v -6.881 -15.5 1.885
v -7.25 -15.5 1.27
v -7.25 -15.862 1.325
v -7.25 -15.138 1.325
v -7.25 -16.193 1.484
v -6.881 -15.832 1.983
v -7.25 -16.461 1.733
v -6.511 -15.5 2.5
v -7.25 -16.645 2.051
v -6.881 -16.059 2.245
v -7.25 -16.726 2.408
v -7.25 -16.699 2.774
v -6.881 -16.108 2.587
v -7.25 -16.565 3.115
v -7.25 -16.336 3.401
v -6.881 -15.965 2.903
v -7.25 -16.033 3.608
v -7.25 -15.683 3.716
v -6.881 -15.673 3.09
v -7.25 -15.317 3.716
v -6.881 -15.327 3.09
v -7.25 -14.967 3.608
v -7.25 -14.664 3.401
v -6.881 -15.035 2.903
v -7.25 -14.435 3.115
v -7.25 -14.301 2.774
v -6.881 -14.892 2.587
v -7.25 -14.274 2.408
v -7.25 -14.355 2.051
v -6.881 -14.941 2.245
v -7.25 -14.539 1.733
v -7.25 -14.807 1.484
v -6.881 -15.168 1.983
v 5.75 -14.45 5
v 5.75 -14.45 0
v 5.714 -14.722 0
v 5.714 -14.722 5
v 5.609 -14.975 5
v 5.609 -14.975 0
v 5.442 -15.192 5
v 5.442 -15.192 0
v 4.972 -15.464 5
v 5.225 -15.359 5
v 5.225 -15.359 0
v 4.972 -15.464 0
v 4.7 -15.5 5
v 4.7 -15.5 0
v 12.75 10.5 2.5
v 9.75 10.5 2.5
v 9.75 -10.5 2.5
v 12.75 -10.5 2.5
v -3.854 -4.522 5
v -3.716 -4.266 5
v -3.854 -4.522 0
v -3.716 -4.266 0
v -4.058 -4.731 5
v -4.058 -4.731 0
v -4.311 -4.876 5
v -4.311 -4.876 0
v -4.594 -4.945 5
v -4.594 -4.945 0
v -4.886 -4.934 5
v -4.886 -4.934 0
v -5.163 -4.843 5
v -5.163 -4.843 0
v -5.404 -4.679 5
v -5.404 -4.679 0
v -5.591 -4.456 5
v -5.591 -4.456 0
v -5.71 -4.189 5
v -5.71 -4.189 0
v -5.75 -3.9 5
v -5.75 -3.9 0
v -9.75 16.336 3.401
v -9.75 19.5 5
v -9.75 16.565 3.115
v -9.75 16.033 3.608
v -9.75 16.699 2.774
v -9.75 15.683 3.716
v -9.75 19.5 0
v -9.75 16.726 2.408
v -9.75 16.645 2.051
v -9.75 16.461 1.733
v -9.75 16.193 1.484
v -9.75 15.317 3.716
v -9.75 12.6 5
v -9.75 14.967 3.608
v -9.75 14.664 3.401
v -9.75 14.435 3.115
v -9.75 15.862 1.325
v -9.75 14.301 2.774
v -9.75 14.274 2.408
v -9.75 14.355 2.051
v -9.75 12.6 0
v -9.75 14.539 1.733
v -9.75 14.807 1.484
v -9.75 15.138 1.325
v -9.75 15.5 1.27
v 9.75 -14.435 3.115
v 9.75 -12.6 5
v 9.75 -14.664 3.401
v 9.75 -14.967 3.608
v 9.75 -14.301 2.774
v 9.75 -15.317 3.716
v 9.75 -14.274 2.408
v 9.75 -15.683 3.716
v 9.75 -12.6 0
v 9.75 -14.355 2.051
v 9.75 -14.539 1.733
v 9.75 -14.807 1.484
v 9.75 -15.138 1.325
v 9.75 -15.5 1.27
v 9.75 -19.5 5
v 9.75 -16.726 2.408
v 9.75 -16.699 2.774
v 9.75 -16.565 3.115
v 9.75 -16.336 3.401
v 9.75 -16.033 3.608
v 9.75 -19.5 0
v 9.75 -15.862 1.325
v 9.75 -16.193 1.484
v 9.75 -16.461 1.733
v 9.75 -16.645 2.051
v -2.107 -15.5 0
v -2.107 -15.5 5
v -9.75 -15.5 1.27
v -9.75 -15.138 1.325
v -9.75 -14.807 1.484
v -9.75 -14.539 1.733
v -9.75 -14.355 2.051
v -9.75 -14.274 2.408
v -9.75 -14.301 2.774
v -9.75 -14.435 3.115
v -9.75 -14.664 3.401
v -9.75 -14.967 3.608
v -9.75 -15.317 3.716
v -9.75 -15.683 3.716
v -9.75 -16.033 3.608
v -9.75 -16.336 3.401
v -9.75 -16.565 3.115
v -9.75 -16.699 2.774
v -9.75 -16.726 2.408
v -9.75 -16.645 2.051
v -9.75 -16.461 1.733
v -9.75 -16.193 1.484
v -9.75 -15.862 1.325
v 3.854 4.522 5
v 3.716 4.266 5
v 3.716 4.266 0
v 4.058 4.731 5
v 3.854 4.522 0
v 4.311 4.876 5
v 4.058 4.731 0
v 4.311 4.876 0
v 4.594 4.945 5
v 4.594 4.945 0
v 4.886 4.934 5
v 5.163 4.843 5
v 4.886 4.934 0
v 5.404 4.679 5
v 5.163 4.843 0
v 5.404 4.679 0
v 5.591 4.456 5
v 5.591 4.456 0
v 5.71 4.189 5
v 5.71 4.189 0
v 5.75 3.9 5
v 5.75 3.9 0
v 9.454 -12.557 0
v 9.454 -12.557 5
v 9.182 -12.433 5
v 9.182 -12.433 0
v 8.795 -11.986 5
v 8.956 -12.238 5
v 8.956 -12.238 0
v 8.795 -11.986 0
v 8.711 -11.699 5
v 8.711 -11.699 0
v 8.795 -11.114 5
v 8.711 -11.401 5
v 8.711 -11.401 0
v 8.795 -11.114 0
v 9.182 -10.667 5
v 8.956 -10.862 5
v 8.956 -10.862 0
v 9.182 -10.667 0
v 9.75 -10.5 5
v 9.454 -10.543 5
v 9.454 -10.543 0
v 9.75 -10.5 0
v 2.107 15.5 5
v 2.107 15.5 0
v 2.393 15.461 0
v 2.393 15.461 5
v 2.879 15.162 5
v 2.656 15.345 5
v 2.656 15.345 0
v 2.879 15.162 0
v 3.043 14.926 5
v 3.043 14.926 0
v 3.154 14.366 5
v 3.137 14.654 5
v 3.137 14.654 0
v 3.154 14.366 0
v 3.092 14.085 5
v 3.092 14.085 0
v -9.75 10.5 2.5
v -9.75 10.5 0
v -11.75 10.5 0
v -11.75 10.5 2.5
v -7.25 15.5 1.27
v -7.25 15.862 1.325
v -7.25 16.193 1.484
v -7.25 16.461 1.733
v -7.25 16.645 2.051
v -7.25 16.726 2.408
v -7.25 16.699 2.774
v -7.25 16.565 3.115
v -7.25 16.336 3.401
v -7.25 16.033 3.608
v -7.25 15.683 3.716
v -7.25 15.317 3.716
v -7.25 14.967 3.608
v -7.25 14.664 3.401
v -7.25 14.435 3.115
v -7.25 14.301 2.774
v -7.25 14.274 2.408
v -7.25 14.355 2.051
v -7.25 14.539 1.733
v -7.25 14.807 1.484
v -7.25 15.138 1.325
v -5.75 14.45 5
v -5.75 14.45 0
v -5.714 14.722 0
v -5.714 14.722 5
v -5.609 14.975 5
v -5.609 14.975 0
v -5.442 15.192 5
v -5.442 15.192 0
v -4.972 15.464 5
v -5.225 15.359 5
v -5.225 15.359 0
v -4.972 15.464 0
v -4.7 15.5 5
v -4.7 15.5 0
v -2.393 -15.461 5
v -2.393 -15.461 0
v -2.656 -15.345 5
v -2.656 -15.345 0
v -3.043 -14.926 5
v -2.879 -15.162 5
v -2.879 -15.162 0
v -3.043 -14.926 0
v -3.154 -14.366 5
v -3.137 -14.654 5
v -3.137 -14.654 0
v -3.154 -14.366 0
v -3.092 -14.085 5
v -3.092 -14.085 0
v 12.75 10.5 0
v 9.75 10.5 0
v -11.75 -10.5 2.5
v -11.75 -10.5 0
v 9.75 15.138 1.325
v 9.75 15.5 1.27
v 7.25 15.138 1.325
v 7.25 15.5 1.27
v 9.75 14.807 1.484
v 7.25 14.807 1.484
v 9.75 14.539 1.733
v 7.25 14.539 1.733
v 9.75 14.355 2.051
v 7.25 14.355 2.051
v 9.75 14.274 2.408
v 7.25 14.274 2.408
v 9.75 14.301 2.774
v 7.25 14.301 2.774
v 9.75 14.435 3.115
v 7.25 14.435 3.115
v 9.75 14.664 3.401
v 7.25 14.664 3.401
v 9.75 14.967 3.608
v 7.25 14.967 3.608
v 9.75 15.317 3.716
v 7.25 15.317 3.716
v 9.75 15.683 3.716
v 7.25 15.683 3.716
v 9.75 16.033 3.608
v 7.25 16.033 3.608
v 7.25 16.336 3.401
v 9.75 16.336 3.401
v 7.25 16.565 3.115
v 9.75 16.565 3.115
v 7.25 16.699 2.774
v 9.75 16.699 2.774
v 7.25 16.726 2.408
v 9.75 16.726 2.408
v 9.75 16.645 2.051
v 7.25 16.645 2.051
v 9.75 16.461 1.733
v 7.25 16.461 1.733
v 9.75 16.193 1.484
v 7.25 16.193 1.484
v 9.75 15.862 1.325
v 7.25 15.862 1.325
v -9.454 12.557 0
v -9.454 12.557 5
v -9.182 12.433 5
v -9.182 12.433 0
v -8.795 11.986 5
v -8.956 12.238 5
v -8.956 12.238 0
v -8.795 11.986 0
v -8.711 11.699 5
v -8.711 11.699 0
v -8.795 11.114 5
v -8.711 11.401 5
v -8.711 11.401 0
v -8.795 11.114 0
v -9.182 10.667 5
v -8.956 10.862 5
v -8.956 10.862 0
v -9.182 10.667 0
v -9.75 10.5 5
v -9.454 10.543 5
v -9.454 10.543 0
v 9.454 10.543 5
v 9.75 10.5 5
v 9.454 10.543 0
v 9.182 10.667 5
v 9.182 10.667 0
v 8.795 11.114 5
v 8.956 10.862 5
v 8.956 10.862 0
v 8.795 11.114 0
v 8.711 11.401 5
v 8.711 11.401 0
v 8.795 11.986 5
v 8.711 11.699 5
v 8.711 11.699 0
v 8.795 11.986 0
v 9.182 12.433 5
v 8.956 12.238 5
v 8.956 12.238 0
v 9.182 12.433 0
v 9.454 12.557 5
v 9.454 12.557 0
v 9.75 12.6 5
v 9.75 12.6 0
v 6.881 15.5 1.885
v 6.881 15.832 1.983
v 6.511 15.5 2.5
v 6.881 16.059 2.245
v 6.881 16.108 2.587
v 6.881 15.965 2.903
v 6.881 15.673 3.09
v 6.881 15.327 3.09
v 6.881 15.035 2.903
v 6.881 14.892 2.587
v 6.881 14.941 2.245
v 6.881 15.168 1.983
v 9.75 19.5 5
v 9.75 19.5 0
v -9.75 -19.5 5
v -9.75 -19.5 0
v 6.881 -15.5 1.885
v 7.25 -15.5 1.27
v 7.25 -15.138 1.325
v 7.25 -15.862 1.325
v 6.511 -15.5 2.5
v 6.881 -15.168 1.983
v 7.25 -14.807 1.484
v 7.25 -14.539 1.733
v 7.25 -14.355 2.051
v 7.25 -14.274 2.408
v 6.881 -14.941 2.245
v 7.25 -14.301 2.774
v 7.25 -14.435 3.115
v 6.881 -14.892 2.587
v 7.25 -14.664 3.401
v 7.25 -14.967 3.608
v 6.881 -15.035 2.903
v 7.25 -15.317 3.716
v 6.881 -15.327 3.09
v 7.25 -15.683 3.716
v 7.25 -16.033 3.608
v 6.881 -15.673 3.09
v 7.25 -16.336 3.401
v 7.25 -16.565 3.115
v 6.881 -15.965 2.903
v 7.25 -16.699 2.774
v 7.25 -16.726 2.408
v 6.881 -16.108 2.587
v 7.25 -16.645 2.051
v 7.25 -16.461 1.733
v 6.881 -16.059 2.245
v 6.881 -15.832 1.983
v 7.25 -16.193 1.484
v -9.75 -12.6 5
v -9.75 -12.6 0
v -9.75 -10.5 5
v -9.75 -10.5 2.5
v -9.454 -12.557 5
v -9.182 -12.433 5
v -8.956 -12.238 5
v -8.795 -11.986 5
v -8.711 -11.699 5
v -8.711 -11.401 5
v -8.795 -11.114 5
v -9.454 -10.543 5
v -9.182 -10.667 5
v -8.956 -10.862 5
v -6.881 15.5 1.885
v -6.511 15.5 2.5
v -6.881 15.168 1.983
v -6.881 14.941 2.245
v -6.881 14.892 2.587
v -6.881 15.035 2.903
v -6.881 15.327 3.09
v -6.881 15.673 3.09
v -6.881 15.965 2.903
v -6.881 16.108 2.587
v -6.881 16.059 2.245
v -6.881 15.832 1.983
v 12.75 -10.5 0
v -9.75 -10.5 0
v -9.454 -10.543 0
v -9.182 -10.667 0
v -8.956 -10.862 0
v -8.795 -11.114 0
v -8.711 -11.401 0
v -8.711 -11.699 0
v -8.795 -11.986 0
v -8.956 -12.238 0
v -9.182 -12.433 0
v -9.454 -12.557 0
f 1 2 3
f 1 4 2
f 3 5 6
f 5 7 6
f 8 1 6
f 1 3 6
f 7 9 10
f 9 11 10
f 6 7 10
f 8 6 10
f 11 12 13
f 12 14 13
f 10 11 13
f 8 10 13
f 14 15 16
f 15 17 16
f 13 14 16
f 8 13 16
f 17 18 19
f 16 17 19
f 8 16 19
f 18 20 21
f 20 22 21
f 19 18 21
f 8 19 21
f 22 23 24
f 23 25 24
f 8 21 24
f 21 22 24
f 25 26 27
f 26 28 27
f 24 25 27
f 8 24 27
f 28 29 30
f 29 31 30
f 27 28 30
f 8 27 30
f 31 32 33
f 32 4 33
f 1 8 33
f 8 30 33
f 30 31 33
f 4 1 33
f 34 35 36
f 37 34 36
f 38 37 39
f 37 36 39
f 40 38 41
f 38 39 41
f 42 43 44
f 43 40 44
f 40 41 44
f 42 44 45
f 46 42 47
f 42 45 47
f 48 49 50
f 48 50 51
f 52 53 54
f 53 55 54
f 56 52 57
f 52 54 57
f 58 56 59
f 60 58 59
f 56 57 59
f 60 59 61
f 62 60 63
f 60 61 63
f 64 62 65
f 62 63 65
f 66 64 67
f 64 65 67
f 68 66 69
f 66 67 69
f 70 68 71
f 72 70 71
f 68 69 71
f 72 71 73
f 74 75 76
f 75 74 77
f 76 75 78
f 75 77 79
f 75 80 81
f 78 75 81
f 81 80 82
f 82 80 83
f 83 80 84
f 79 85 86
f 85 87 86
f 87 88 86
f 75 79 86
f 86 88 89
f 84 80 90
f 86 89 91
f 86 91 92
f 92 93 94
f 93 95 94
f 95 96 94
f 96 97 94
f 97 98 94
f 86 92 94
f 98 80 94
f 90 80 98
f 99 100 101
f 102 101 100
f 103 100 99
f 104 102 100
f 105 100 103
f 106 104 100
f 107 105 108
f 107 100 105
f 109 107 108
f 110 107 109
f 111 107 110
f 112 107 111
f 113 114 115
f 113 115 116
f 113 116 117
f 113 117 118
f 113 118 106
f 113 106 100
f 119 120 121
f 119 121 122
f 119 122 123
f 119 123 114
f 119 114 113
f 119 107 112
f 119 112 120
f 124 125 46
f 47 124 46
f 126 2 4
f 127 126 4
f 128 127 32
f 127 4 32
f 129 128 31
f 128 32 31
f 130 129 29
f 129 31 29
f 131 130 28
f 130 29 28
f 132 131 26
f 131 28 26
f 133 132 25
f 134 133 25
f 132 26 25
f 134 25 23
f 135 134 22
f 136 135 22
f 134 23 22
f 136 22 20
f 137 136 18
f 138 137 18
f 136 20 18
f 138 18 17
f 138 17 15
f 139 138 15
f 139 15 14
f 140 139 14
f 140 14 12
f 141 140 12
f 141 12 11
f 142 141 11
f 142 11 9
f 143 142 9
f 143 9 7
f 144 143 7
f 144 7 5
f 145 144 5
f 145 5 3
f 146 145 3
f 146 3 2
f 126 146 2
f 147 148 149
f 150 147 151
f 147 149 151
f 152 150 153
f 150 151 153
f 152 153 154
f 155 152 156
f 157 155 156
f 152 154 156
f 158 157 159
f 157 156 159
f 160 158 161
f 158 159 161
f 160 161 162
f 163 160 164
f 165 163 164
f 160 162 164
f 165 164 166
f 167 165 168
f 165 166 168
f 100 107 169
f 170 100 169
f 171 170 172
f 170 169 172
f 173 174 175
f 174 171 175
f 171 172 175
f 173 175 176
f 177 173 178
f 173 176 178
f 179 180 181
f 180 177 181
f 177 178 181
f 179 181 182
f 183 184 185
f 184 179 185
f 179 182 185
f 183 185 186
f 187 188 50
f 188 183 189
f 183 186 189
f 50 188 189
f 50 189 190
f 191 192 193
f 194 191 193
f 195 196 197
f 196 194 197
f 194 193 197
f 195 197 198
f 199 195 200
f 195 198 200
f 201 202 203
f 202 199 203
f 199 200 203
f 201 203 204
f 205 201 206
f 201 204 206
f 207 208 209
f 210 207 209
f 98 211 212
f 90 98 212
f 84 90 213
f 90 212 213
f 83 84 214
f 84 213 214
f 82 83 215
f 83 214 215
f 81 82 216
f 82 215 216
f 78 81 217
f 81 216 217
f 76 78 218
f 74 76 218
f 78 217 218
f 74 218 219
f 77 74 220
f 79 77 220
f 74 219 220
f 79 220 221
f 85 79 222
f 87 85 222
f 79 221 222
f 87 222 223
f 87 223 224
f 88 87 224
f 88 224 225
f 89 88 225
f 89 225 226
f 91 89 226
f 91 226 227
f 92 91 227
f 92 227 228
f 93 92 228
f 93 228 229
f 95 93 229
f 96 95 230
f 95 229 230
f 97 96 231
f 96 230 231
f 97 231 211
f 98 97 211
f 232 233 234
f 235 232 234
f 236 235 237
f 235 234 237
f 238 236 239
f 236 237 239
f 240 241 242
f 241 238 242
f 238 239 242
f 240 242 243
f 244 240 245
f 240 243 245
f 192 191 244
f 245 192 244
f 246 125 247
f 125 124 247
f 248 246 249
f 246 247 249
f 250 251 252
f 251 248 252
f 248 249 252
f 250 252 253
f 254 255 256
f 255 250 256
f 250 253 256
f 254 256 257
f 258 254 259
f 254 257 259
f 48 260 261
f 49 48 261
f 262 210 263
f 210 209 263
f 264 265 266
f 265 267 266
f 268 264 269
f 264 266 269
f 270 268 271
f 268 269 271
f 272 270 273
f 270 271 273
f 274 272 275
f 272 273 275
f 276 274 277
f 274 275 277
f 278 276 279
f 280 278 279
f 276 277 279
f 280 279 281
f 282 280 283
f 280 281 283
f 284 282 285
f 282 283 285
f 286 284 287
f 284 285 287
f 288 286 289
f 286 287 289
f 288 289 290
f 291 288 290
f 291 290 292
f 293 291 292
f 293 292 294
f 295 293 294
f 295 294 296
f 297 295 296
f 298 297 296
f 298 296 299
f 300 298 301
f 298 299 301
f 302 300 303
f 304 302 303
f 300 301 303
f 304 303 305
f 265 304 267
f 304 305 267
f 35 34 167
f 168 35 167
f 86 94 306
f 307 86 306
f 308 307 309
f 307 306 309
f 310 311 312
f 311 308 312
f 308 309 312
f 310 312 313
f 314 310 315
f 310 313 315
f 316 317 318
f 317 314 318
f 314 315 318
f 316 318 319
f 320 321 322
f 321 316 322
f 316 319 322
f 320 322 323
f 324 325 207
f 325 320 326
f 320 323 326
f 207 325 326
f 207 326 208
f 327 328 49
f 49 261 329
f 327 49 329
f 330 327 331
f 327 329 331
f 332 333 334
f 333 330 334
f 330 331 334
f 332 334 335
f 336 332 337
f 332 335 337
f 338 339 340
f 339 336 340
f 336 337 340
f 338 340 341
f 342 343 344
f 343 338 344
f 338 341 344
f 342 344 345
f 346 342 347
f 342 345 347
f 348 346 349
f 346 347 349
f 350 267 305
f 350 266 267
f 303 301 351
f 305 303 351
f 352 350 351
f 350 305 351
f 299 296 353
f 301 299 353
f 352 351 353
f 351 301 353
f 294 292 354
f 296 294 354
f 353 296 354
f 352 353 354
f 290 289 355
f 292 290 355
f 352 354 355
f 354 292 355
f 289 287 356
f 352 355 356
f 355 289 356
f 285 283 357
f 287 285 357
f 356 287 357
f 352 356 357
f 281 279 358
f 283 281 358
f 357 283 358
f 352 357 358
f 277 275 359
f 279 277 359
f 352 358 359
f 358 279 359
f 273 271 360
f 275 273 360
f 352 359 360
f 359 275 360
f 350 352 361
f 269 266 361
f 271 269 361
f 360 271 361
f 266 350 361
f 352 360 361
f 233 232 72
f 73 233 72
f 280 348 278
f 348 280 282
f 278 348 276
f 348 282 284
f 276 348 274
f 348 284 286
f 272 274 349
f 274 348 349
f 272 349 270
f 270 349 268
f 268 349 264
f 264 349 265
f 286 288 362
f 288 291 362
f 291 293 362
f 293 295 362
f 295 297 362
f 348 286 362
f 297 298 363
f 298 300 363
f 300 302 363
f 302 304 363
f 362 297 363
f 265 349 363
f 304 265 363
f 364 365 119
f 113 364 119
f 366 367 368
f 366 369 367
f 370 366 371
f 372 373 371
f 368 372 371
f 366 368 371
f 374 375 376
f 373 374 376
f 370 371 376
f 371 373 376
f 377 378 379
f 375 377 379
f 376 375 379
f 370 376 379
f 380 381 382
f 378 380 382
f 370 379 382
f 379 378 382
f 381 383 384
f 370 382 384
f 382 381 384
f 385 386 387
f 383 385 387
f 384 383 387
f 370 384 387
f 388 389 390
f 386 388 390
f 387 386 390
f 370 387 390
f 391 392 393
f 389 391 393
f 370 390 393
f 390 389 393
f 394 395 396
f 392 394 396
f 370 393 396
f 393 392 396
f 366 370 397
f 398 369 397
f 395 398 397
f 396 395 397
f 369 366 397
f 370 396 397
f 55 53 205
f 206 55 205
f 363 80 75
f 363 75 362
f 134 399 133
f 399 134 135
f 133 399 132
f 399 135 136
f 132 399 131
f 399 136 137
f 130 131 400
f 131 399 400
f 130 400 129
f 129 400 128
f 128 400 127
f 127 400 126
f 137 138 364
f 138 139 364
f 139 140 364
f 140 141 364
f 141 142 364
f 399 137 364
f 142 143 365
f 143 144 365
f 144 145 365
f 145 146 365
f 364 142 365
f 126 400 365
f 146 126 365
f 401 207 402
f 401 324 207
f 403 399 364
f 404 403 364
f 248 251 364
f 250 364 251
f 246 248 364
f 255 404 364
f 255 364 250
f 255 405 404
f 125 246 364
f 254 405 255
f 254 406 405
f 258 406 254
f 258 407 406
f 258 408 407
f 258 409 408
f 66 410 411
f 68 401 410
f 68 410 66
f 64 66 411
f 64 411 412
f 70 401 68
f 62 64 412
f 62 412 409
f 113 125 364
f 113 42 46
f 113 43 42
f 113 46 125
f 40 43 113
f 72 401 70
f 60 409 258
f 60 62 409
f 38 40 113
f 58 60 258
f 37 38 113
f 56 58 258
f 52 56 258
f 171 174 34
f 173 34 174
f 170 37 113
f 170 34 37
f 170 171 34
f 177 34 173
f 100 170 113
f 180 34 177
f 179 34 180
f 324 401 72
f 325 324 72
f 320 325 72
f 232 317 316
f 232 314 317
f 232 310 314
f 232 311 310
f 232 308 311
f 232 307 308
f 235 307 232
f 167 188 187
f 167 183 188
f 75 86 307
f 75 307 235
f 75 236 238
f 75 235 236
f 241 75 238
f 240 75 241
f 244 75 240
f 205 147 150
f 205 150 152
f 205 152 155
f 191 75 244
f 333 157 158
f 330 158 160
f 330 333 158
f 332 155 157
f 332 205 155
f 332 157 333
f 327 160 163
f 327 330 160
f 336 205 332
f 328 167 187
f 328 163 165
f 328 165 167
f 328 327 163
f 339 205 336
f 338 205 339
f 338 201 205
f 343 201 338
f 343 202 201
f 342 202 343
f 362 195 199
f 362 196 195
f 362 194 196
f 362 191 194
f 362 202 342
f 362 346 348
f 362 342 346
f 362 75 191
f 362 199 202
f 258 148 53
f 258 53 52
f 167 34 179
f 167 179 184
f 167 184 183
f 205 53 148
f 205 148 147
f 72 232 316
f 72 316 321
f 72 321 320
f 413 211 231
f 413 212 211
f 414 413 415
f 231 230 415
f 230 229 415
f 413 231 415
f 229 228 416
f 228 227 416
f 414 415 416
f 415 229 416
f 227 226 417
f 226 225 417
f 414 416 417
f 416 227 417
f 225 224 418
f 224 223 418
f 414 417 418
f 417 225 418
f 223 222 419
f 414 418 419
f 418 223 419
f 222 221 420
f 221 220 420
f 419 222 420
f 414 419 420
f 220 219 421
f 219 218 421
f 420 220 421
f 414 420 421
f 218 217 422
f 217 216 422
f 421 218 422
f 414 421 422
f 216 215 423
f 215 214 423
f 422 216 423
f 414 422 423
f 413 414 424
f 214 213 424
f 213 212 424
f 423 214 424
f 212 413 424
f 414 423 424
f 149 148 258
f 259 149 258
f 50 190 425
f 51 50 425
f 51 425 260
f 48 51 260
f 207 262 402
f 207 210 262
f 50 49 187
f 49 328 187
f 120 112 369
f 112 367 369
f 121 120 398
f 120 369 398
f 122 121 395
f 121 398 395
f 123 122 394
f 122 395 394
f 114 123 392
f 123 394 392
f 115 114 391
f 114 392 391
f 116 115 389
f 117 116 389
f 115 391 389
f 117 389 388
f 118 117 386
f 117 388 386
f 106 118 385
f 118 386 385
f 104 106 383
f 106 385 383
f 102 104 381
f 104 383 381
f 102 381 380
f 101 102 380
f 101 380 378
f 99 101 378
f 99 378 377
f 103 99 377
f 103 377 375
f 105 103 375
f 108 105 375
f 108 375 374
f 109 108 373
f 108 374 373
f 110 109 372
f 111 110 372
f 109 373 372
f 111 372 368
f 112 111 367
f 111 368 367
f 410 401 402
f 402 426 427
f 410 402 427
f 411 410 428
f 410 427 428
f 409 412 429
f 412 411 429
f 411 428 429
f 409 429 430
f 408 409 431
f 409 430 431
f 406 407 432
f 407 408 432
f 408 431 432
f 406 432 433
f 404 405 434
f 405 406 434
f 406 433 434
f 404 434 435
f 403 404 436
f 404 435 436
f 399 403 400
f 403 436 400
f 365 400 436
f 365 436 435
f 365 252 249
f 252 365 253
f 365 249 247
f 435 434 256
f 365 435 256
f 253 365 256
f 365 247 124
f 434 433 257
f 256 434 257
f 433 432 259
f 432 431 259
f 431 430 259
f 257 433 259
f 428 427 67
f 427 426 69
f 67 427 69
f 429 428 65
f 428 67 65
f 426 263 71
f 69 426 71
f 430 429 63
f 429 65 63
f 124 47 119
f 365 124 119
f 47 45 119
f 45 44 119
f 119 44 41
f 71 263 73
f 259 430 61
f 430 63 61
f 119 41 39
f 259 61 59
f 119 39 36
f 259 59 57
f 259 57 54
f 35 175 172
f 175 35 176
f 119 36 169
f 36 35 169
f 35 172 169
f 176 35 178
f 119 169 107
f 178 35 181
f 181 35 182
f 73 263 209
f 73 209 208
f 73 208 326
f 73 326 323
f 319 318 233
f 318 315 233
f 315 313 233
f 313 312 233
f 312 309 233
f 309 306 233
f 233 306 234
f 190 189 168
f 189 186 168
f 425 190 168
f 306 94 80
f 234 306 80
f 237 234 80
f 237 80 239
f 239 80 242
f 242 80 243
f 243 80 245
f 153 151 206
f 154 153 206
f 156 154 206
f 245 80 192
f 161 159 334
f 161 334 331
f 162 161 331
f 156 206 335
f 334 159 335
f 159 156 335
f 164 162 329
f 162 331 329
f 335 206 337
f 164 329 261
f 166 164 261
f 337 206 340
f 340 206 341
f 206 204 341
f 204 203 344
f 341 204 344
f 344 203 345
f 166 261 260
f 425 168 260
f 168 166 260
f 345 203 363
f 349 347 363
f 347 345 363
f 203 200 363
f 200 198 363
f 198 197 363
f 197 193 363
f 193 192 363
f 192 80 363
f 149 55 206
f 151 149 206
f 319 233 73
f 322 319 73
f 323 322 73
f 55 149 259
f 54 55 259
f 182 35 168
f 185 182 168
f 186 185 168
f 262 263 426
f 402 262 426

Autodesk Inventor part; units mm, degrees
ref_plane "YZ Plane" through (0, 0, 0) normal (1, 0, 0) x (0, 1, 0)
ref_plane "XZ Plane" through (0, 0, 0) normal (0, 1, 0) x (-1, 0, 0)
ref_plane "XY Plane" through (0, 0, 0) normal (0, 0, 1) x (1, 0, 0)
sketch "スケッチ1" plane through (0, 0, 0) normal (0, 0, 1) x (1, 0, 0)
  line L0 (-9.75, -19.5) -> (9.75, -19.5) construction
  line L1 (9.75, -19.5) -> (9.75, 19.5) construction
  line L2 (9.75, 19.5) -> (-9.75, 19.5) construction
  line L3 (-9.75, 19.5) -> (-9.75, -19.5) construction
  line L4 (-9.75, -19.5) -> (9.75, 19.5) construction
  line L5 (9.75, -19.5) -> (-9.75, 19.5) construction
  line L6 (-9.75, 10.5) -> (-9.75, 19.5) construction
  line L7 (-9.75, 19.5) -> (9.75, 19.5)
  line L8 (9.75, 19.5) -> (9.75, 10.5) construction
  line L9 (-9.75, 10.5) -> (-11.75, 10.5)
  line L10 (-11.75, 10.5) -> (-11.75, -10.5)
  line L11 (-11.75, -10.5) -> (-9.75, -10.5)
  line L12 (-9.75, -10.5) -> (-9.75, -19.5) construction
  line L13 (-9.75, -19.5) -> (9.75, -19.5)
  line L14 (9.75, -19.5) -> (9.75, -10.5) construction
  line L15 (9.75, -10.5) -> (12.75, -10.5)
  line L16 (12.75, -10.5) -> (12.75, 10.5)
  line L17 (12.75, 10.5) -> (9.75, 10.5)
  line L18 (0, 0) -> (12.75, 0) construction
  circle A0 centre (-9.75, 11.55) radius 1.05 construction
  circle A1 centre (-9.75, -11.55) radius 1.05 construction
  circle A2 centre (9.75, 11.55) radius 1.05 construction
  circle A3 centre (9.75, -11.55) radius 1.05 construction
  line L19 (-9.75, 19.5) -> (-9.75, 12.6)
  arc A4 (-9.75, 10.5) -> (-9.75, 12.6) centre (-9.75, 11.55) ccw
  arc A5 (-9.75, -12.6) -> (-9.75, -10.5) centre (-9.75, -11.55) ccw
  line L20 (-9.75, -12.6) -> (-9.75, -19.5)
  line L21 (9.75, 12.6) -> (9.75, 19.5)
  arc A6 (9.75, 12.6) -> (9.75, 10.5) centre (9.75, 11.55) ccw
  line L22 (9.75, -12.6) -> (9.75, -19.5)
  arc A7 (9.75, -10.5) -> (9.75, -12.6) centre (9.75, -11.55) ccw
  dimension "d21" = 2
  dimension "d23" = 3
  dimension "d30" = 19.5
  dimension "d48" = 9
  dimension "d49" = 39
  dimension "d50" = 2.1
extrude "押し出し1" add sketch "スケッチ1" along normal blind 5
sketch "スケッチ2" plane through (9.75, -19.5, 0) normal (1, 0, 0) x (0, 0, -1)
  line L0 (0, 0) -> (-5, 0) projected
  line L1 (0, 39) -> (-5, 39) projected
  point P0 (0, 19.5)
  point P1 (-2.5, 4)
  point P2 (-2.5, 35)
  point P3 (-2.5, 0)
  dimension "d53" = 4
  dimension "d54" = 4
hole "穴1" at (9.75, -15.5, 2.5) at (9.75, 15.5, 2.5) direction (-1, 0, 0) diameter 2.459 depth 2.5 tip angle 118 thread size "M3x0.5" class "6H" standard "ISO Metric profile"
mirror "ミラー1" about plane through (0, 0, 0) normal (1, 0, 0) of "穴1"
sketch "スケッチ3" plane through (0, 0, 5) normal (0, 0, 1) x (1, 0, 0)
  line L0 (9.75, 12.6) -> (9.75, 19.5) projected
  line L1 (-9.75, 19.5) -> (-9.75, 12.6) projected
  line L2 (-14.3307, 15.6684) -> (-9.75, 15.6684)
  line L3 (-9.75, 15.6684) -> (-9.75, -16.7148)
  line L4 (-9.75, -16.7148) -> (-14.3307, -16.7148)
  line L5 (-14.3307, -16.7148) -> (-14.3307, 15.6684)
  line L6 (15.2214, 11.55) -> (9.75, 11.55)
  line L7 (9.75, 11.55) -> (9.75, -15.9078)
  line L8 (9.75, -15.9078) -> (15.2214, -15.9078)
  line L9 (15.2214, -15.9078) -> (15.2214, 11.55)
  point P0 (0, 0)
extrude "押し出し2" cut sketch "スケッチ3" against normal blind 2.5
sketch "スケッチ4" plane through (0, 0, 5) normal (0, 0, 1) x (1, 0, 0)
  line L0 (9.75, 12.6) -> (9.75, 19.5) projected
  line L1 (9.75, 19.5) -> (-9.75, 19.5) projected
  line L2 (-9.75, -12.6) -> (-9.75, -19.5) projected
  line L3 (-9.75, -19.5) -> (9.75, -19.5) projected
  line L4 (-5.75, 15.5) -> (5.75, 15.5) construction
  line L5 (5.75, 15.5) -> (5.75, -15.5) construction
  line L6 (5.75, -15.5) -> (-5.75, -15.5) construction
  line L7 (-5.75, -15.5) -> (-5.75, 15.5) construction
  line L8 (5.75, 15.5) -> (-5.75, -15.5) construction
  line L9 (3.6168, 15.5) -> (-5.75, 15.5)
  line L10 (-5.75, 15.5) -> (-5.75, -9.7497)
  line L11 (-5.75, -9.7497) -> (3.6168, 15.5)
  line L12 (-3.6168, -15.5) -> (5.75, -15.5)
  line L13 (5.75, -15.5) -> (5.75, 9.7497)
  line L14 (5.75, 9.7497) -> (-3.6168, -15.5)
  point P0 (0, 0)
  dimension "d64" = 4
  dimension "d65" = 4
  dimension "d66" = 4
  dimension "d67" = 4
  dimension "d68" = 4
extrude "押し出し3" cut sketch "スケッチ4" against normal blind 5
fillet "フィレット1" radius 1.05 6 edges at (-3.6168, -15.5, 2.5) (-5.75, 15.5, 2.5) (3.6168, 15.5, 2.5) (5.75, 9.7497, 2.5) (-5.75, -9.7497, 2.5) (5.75, -15.5, 2.5)
equation "\"d48\" = d26 + d35"
equation "\"d49\" = d38"
equation "\"d53\" = d35"
equation "\"d54\" = d53"
equation "\"d66\" = d65"
equation "\"d68\" = d67"
equation "\"d26\" = 5"
equation "\"d35\" = 4"
equation "\"d38\" = 39"
properties part number "胴体_メインフレーム_1_12" material "アセタール樹脂、黒"
